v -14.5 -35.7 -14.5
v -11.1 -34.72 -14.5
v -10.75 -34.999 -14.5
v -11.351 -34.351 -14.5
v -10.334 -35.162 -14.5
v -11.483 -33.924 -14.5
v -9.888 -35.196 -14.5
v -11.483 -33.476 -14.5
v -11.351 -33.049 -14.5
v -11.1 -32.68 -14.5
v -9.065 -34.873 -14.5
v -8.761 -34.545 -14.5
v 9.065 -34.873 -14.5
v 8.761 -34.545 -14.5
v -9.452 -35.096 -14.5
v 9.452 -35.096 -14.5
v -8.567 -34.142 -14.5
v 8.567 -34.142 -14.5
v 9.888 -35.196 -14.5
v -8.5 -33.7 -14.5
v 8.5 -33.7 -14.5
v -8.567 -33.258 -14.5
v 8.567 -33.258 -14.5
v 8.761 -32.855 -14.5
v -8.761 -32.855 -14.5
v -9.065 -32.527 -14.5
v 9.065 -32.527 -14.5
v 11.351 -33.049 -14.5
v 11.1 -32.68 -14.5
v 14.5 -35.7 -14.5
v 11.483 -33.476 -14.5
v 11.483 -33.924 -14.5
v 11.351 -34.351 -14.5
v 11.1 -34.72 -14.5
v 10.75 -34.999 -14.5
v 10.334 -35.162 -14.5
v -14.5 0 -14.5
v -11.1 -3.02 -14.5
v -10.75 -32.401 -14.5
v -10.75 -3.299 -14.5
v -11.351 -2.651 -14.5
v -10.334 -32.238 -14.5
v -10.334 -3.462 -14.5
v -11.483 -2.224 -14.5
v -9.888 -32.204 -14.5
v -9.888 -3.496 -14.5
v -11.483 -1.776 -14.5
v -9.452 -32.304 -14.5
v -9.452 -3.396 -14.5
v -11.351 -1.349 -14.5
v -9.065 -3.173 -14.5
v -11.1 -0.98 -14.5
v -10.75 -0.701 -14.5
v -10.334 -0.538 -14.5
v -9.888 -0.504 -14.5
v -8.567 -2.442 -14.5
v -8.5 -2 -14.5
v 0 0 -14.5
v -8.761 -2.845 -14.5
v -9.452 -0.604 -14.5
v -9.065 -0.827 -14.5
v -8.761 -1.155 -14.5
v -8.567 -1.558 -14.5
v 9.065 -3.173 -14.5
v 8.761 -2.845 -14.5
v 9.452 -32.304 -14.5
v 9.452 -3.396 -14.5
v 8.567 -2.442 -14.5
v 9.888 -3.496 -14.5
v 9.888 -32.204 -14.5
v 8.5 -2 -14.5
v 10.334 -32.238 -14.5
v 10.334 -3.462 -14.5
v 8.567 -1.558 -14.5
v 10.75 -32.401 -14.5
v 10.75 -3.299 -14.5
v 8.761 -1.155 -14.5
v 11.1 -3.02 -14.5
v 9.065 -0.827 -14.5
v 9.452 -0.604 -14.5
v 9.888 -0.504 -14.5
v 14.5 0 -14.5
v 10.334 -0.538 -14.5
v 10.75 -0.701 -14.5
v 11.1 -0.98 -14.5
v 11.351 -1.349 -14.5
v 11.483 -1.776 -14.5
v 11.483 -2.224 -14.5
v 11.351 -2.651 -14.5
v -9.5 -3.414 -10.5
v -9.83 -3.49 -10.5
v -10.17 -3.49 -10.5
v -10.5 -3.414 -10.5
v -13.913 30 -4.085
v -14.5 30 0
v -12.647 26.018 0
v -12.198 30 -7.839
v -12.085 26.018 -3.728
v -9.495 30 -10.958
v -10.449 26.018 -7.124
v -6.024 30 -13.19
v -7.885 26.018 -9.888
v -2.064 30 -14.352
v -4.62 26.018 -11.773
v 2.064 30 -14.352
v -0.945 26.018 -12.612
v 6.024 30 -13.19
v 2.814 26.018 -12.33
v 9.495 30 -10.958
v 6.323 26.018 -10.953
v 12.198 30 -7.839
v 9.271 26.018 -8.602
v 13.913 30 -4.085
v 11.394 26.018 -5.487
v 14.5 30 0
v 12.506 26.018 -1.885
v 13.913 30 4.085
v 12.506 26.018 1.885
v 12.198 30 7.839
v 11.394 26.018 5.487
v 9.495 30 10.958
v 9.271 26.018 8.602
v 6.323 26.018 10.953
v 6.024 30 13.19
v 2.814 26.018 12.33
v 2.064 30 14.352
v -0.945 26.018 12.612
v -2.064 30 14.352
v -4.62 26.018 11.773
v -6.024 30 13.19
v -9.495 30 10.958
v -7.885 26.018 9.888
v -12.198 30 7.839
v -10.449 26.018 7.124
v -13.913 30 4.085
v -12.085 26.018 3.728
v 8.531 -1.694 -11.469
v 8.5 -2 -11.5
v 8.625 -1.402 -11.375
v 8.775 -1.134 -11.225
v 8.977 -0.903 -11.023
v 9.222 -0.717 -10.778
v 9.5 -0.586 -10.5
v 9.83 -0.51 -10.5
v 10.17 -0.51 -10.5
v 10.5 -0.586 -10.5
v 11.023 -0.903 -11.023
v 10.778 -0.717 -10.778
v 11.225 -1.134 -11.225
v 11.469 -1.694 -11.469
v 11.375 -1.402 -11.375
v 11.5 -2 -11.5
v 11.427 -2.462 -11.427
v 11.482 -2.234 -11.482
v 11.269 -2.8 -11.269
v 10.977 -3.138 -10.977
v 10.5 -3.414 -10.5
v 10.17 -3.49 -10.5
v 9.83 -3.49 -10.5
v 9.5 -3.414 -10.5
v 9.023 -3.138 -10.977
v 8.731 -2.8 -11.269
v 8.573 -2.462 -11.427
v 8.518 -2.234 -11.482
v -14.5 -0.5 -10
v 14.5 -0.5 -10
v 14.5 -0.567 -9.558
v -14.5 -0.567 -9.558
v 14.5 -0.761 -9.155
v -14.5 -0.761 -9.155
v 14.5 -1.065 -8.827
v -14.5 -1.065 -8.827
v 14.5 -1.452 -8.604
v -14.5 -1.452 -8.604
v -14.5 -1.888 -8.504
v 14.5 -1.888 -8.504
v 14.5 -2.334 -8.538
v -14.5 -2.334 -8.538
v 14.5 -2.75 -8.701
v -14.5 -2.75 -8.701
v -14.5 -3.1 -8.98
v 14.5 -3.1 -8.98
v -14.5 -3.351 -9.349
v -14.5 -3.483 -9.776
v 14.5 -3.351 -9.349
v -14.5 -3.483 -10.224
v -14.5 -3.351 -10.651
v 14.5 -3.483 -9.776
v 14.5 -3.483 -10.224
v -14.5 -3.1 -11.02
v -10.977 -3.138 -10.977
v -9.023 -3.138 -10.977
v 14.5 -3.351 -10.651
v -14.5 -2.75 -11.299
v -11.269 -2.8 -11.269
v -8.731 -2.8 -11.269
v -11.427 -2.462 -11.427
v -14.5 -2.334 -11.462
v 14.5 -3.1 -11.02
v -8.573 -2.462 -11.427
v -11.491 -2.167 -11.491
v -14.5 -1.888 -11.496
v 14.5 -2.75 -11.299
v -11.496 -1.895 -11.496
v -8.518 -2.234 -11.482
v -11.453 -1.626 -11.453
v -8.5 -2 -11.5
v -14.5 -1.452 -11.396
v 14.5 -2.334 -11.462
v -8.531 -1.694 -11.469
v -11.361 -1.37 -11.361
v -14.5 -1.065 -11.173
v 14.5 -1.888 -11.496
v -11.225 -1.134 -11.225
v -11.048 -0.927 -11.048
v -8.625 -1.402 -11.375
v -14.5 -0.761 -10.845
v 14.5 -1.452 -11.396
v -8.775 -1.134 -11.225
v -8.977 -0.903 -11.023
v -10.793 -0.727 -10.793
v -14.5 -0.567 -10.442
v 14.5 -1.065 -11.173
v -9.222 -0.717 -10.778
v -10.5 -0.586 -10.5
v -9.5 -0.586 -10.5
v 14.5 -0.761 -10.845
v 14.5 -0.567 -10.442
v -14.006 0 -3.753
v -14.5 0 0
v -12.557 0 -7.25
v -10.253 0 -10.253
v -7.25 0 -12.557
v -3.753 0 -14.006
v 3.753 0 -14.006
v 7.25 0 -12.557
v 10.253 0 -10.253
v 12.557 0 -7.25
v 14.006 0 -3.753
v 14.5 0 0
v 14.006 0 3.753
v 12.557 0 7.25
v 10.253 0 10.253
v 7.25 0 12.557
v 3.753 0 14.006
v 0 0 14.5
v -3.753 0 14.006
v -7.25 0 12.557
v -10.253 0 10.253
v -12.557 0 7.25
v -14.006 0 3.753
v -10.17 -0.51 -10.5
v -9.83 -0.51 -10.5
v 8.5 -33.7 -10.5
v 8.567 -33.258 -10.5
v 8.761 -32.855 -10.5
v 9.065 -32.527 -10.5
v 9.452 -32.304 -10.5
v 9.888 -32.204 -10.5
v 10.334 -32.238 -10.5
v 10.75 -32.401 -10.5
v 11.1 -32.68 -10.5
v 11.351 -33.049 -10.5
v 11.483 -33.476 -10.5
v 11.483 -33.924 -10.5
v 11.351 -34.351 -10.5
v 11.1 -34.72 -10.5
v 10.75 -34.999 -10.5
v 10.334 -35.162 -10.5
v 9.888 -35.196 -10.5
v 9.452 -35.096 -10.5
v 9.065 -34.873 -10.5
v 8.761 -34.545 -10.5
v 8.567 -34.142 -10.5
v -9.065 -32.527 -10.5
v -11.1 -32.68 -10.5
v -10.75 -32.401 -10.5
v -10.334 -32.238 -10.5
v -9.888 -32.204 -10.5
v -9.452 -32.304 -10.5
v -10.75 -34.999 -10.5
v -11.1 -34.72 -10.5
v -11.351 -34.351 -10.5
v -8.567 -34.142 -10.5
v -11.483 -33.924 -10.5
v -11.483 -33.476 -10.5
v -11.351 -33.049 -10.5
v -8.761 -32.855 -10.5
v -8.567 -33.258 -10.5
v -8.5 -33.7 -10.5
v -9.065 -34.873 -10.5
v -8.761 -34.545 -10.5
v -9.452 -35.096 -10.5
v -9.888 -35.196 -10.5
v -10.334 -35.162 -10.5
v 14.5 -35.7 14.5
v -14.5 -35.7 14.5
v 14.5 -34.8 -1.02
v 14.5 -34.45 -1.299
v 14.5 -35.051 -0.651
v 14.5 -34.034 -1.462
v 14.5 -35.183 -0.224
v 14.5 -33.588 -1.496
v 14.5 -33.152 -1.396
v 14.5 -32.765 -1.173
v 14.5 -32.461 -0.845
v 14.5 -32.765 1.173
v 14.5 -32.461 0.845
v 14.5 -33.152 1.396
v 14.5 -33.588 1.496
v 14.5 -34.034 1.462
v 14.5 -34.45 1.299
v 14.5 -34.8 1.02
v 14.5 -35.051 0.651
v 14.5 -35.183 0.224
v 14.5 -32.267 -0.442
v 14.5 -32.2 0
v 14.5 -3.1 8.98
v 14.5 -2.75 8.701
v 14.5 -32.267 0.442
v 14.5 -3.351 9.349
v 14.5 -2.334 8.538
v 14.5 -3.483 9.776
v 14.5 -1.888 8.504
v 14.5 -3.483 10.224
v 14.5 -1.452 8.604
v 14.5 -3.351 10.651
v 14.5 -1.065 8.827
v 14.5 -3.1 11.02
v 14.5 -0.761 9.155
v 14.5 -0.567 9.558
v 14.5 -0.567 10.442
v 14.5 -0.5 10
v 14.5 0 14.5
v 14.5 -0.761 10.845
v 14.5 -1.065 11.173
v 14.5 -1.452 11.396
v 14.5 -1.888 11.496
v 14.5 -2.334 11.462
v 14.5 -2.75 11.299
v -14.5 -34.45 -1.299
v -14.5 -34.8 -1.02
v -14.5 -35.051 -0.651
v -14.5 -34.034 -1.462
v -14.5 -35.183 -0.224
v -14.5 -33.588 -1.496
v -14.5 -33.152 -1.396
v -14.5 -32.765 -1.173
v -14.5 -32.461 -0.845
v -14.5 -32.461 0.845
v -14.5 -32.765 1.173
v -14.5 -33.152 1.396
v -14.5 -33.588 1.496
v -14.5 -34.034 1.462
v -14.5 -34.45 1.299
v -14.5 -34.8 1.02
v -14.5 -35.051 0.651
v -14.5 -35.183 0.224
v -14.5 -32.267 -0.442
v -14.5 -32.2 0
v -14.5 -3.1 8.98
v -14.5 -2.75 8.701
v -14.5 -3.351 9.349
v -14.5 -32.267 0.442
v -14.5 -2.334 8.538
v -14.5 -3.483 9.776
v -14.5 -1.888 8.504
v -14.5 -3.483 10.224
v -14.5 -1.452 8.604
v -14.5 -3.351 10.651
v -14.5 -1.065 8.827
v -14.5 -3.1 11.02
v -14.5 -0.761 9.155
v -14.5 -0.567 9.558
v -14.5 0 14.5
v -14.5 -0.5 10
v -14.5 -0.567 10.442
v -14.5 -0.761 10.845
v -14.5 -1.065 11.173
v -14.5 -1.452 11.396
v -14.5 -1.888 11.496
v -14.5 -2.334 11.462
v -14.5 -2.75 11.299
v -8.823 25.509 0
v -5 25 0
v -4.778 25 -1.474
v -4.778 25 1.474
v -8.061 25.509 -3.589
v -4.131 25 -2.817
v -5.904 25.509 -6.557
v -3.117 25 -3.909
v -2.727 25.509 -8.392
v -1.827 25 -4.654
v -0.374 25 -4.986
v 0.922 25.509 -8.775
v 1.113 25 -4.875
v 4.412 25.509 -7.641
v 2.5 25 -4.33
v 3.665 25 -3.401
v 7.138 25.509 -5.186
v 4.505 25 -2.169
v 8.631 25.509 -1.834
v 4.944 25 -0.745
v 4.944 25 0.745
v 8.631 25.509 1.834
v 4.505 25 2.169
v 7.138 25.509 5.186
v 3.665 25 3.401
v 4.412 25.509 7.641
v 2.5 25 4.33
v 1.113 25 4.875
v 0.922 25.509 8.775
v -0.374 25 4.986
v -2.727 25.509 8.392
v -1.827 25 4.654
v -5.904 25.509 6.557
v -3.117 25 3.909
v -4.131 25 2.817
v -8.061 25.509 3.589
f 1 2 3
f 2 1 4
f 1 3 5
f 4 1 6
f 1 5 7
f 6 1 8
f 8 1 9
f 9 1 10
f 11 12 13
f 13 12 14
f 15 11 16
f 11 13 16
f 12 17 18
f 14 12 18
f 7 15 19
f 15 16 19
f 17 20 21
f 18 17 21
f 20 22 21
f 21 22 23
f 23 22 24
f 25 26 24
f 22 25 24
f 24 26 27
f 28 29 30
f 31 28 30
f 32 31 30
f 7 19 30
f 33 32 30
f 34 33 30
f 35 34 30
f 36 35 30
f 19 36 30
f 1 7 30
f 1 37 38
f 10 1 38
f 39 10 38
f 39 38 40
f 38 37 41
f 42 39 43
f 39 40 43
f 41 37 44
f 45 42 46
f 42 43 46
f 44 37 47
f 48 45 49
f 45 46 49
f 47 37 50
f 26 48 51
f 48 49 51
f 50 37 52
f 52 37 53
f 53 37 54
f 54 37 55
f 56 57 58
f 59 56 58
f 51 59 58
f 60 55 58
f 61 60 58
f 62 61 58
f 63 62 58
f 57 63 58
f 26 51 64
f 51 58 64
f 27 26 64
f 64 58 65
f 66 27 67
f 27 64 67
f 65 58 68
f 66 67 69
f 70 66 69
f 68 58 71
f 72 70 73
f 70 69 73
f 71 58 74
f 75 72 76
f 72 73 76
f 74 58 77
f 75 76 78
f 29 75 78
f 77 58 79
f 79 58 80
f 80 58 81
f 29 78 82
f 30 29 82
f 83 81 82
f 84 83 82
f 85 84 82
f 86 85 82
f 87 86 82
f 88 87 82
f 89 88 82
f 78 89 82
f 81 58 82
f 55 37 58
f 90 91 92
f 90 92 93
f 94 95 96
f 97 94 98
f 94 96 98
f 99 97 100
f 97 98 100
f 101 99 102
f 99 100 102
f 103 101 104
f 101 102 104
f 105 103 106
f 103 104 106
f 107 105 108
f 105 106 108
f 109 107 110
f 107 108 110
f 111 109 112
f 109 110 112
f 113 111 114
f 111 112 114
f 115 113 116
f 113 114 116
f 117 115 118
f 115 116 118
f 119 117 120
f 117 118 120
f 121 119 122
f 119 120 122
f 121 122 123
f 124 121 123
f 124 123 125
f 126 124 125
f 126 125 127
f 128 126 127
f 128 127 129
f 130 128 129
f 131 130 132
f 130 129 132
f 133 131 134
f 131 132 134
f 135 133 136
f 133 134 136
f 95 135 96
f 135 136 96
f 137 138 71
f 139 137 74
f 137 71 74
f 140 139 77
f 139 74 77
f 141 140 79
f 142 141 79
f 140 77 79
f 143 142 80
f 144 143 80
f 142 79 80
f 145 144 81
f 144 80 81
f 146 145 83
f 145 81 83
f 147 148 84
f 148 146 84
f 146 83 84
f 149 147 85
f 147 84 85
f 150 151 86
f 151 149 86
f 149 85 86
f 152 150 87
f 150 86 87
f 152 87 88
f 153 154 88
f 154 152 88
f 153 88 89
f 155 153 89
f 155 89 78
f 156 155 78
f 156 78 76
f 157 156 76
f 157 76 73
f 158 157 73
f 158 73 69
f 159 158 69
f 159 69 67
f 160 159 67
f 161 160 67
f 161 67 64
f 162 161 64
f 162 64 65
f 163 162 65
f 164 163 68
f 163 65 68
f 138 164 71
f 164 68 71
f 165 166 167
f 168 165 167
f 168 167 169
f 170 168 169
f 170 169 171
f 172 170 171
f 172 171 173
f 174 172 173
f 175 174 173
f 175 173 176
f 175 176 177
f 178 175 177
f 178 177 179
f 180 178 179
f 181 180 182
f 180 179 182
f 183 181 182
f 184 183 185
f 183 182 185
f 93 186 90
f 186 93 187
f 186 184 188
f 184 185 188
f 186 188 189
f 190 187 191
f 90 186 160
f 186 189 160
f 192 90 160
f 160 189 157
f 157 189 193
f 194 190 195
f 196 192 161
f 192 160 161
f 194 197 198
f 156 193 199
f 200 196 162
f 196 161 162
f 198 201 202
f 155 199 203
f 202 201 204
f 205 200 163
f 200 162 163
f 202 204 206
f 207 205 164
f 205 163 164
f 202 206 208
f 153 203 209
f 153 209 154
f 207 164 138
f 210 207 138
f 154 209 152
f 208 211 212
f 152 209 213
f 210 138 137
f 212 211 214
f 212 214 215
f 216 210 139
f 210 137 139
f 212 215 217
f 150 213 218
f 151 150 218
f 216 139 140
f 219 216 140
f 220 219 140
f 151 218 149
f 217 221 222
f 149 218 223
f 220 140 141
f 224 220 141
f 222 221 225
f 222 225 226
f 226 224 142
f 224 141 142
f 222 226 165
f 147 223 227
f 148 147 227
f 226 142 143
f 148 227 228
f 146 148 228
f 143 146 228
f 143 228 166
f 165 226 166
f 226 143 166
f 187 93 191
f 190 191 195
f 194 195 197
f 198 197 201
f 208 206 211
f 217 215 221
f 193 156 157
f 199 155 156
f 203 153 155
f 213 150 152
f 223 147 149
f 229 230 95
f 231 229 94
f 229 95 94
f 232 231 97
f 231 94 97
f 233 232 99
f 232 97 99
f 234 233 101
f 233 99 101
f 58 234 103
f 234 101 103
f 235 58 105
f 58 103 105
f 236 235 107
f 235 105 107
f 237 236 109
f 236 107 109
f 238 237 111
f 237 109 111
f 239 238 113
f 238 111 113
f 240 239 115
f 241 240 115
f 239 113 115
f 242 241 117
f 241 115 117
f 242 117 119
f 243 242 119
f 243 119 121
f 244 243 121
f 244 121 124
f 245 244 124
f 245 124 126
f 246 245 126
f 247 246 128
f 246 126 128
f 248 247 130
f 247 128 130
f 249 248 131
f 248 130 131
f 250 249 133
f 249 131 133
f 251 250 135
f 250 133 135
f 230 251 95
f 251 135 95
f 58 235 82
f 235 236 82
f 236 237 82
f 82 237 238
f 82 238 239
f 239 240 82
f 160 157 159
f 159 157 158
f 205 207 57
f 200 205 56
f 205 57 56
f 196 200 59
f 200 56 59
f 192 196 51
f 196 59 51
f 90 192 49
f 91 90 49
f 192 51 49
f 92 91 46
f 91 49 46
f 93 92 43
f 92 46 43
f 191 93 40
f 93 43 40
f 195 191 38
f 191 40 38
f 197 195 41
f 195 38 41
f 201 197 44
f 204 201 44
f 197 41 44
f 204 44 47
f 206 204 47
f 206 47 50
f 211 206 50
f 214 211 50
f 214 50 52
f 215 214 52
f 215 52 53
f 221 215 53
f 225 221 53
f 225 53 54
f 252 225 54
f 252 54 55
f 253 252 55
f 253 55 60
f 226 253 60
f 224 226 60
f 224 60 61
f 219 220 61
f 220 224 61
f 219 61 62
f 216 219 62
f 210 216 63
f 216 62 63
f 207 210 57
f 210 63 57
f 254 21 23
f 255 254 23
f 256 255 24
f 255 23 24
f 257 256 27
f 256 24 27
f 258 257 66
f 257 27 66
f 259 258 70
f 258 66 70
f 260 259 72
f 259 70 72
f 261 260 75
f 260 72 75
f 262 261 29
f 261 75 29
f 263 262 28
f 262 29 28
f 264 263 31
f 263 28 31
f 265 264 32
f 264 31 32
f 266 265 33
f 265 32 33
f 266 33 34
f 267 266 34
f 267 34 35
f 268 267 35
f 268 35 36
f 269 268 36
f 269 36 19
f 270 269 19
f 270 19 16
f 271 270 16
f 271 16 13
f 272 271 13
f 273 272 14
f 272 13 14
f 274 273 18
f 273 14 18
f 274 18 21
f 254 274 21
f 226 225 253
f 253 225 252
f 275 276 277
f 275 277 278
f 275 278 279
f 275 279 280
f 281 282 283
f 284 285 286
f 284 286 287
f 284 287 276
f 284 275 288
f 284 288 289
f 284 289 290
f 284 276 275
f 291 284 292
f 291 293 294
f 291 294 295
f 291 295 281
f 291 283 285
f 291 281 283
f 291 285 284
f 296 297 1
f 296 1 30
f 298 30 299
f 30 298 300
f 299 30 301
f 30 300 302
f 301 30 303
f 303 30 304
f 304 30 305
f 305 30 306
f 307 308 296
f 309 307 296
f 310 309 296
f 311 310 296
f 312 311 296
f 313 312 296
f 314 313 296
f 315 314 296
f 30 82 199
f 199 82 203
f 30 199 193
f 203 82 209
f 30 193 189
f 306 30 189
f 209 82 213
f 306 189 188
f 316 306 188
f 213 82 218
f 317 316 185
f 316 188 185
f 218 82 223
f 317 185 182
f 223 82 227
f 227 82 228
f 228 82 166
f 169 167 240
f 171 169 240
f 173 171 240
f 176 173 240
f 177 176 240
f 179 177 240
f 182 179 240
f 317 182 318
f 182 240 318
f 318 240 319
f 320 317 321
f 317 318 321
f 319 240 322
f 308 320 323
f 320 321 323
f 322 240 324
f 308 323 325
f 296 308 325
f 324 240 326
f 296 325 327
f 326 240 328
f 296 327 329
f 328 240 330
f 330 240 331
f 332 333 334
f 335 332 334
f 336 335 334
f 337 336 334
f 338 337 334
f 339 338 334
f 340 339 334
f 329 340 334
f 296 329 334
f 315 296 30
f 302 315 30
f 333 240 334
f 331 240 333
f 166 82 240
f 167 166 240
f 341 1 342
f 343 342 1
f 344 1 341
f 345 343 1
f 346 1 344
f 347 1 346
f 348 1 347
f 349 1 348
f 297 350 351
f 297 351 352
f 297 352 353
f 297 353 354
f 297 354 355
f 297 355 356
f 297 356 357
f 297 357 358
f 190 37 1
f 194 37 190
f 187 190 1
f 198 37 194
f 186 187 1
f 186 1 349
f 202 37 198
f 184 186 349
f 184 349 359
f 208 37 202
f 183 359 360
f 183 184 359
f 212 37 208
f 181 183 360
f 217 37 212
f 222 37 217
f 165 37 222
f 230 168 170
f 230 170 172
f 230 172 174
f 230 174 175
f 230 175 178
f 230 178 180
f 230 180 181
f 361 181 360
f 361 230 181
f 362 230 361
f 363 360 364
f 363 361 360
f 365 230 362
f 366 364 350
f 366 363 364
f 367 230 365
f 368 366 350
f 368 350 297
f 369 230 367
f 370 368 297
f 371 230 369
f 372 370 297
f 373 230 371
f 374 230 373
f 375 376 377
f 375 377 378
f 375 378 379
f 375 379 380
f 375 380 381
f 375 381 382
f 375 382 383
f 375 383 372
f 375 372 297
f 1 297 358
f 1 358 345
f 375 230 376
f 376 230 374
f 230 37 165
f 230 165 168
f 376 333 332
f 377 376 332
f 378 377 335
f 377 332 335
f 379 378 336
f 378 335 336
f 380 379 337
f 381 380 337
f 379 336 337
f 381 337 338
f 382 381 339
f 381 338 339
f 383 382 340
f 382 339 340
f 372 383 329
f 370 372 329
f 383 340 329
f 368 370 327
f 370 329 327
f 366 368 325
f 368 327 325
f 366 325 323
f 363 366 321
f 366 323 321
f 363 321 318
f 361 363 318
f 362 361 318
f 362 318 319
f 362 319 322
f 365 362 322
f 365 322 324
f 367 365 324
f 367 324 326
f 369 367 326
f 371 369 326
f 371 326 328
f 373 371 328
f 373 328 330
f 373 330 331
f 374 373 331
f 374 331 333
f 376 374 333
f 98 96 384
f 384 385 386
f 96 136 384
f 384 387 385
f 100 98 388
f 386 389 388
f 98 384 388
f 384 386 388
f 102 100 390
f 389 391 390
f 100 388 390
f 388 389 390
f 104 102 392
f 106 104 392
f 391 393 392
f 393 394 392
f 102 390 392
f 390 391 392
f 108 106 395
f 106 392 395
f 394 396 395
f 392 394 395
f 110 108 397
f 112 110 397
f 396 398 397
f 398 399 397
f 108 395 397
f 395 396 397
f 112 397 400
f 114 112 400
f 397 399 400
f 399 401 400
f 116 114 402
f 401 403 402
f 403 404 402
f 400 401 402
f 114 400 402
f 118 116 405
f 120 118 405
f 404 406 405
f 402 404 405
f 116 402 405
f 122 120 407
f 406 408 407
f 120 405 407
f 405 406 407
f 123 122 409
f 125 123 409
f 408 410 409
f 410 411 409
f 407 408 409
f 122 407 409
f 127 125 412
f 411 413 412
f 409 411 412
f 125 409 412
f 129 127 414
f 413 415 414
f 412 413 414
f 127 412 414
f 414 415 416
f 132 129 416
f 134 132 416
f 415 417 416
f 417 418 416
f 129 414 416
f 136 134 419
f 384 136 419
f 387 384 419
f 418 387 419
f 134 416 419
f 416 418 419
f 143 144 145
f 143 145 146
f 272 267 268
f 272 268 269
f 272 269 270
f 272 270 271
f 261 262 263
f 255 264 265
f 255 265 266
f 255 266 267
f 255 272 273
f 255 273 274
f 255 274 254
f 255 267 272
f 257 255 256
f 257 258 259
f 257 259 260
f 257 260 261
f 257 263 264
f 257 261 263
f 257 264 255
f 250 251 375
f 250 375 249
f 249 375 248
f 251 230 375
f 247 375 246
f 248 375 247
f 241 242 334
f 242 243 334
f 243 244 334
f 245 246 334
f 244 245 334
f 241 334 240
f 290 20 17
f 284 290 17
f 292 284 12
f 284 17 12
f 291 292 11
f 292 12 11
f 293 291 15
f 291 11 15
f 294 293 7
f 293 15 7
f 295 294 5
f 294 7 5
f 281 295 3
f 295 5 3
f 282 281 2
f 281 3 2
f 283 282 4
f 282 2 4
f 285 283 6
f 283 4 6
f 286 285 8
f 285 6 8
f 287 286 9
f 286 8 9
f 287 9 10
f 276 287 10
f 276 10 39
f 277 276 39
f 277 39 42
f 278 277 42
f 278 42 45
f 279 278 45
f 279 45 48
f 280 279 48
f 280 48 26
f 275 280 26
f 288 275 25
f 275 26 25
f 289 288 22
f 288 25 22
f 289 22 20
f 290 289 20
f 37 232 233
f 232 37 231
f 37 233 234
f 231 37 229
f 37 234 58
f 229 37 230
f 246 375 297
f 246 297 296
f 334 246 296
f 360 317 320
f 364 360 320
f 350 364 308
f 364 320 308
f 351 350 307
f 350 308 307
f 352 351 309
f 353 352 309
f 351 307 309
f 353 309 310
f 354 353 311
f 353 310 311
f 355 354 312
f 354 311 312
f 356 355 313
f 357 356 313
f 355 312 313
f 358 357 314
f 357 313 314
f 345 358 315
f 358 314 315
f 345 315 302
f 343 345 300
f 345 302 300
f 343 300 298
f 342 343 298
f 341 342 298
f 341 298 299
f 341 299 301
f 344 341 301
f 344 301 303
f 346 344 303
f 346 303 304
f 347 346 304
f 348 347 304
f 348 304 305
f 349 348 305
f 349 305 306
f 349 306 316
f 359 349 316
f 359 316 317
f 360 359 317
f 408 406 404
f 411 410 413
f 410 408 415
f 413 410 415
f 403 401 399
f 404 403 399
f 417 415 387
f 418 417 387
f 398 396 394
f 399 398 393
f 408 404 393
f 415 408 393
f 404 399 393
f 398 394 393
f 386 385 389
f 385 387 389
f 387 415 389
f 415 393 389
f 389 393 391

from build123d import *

# Parameters (mm, degrees)
SKETCH_2_W          = 29
SKETCH_2_H          = 29
EXTRUDE_1_DEPTH     = 35.7
SKETCH_3_R          = 1.5
CUT_EXTRUDE_1_DEPTH = 4
CUT_EXTRUDE_2_REACH = 50.226
SKETCH_4_R          = 1.5


with BuildPart() as part:
    # 草图1 → 旋转1 (revolve)
    with BuildSketch(Plane.XY):
        Polygon((0, 0), (-14.5, 0), (-14.5, 30), (-12.646873789, 26.018036841), (-5, 25), (0, 25), align=None)
    revolve(axis=Axis((0, 25, 0), (0, -1, 0)))

    # 草图2 → 凸台-拉伸1 (add)
    with BuildSketch(Plane.XZ):
        Rectangle(SKETCH_2_W, SKETCH_2_H)
    extrude(amount=EXTRUDE_1_DEPTH)

    # 草图3 → 切除-拉伸1 (cut)
    with BuildSketch(Plane(origin=(0, 0, -14.5), x_dir=(-1, 0, 0), z_dir=(0, 0, -1))):
        with Locations((-10, -2)):
            Circle(SKETCH_3_R)
        with Locations((-10, -33.7)):
            Circle(SKETCH_3_R)
        with Locations(Location((10, -33.7, 0), (0, 0, 180))):
            Circle(SKETCH_3_R)
        with Locations(Location((10, -2, 0), (0, 0, 180))):
            Circle(SKETCH_3_R)
    extrude(amount=-CUT_EXTRUDE_1_DEPTH, mode=Mode.SUBTRACT)

    # 草图4 → 切除-拉伸2 (cut, up to next)
    with BuildSketch(Plane(origin=(14.5, 0, 0), x_dir=(0, 0, -1), z_dir=(1, 0, 0)), mode=Mode.PRIVATE) as cut_extrude_2_sk1:
        with Locations(Location((-10, -2, 0), (0, 0, 90))):
            Circle(SKETCH_4_R)
    cut_extrude_2_tool1 = extrude(cut_extrude_2_sk1.sketch, amount=-CUT_EXTRUDE_2_REACH, mode=Mode.PRIVATE) & part.part
    # 草图4 → 切除-拉伸2 (cut, up to next)
    with BuildSketch(Plane(origin=(14.5, 0, 0), x_dir=(0, 0, -1), z_dir=(1, 0, 0)), mode=Mode.PRIVATE) as cut_extrude_2_sk2:
        with Locations(Location((0, -33.7, 0), (0, 0, 90))):
            Circle(SKETCH_4_R)
    cut_extrude_2_tool2 = extrude(cut_extrude_2_sk2.sketch, amount=-CUT_EXTRUDE_2_REACH, mode=Mode.PRIVATE) & part.part
    # 草图4 → 切除-拉伸2 (cut, up to next)
    with BuildSketch(Plane(origin=(14.5, 0, 0), x_dir=(0, 0, -1), z_dir=(1, 0, 0)), mode=Mode.PRIVATE) as cut_extrude_2_sk3:
        with Locations(Location((10, -2, 0), (0, 0, 90))):
            Circle(SKETCH_4_R)
    cut_extrude_2_tool3 = extrude(cut_extrude_2_sk3.sketch, amount=-CUT_EXTRUDE_2_REACH, mode=Mode.PRIVATE) & part.part
    add(cut_extrude_2_tool1.solids().sort_by_distance((14.5, -2, 10))[0], mode=Mode.SUBTRACT)
    add(cut_extrude_2_tool2.solids().sort_by_distance((14.5, -33.7, 0))[0], mode=Mode.SUBTRACT)
    add(cut_extrude_2_tool3.solids().sort_by_distance((14.5, -2, -10))[0], mode=Mode.SUBTRACT)


solid = part.part
